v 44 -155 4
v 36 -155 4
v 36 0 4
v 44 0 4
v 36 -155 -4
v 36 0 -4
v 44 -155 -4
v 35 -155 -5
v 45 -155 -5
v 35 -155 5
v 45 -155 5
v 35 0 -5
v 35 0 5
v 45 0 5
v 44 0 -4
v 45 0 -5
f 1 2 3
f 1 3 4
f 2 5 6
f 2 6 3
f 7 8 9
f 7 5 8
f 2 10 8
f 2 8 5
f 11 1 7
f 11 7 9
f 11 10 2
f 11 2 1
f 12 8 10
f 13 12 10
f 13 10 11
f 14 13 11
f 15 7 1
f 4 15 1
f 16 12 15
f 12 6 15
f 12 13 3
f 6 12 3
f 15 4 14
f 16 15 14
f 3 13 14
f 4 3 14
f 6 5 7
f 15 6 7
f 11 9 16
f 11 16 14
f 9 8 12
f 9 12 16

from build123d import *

# Parameters (mm, degrees)
SKETCH_1_W      = 10
SKETCH_1_H      = 10
SKETCH_1_W_2    = 8
SKETCH_1_H_2    = 8
EXTRUDE_1_DEPTH = 155


with BuildPart() as part:
    # 草图1 → 凸台-拉伸1 (new body)
    with BuildSketch(Plane.XZ.offset(155)):
        with Locations((40, 0)):
            Rectangle(SKETCH_1_W, SKETCH_1_H)
        with Locations((40, 0)):
            Rectangle(SKETCH_1_W_2, SKETCH_1_H_2, mode=Mode.SUBTRACT)
    extrude(amount=-EXTRUDE_1_DEPTH)


solid = part.part
